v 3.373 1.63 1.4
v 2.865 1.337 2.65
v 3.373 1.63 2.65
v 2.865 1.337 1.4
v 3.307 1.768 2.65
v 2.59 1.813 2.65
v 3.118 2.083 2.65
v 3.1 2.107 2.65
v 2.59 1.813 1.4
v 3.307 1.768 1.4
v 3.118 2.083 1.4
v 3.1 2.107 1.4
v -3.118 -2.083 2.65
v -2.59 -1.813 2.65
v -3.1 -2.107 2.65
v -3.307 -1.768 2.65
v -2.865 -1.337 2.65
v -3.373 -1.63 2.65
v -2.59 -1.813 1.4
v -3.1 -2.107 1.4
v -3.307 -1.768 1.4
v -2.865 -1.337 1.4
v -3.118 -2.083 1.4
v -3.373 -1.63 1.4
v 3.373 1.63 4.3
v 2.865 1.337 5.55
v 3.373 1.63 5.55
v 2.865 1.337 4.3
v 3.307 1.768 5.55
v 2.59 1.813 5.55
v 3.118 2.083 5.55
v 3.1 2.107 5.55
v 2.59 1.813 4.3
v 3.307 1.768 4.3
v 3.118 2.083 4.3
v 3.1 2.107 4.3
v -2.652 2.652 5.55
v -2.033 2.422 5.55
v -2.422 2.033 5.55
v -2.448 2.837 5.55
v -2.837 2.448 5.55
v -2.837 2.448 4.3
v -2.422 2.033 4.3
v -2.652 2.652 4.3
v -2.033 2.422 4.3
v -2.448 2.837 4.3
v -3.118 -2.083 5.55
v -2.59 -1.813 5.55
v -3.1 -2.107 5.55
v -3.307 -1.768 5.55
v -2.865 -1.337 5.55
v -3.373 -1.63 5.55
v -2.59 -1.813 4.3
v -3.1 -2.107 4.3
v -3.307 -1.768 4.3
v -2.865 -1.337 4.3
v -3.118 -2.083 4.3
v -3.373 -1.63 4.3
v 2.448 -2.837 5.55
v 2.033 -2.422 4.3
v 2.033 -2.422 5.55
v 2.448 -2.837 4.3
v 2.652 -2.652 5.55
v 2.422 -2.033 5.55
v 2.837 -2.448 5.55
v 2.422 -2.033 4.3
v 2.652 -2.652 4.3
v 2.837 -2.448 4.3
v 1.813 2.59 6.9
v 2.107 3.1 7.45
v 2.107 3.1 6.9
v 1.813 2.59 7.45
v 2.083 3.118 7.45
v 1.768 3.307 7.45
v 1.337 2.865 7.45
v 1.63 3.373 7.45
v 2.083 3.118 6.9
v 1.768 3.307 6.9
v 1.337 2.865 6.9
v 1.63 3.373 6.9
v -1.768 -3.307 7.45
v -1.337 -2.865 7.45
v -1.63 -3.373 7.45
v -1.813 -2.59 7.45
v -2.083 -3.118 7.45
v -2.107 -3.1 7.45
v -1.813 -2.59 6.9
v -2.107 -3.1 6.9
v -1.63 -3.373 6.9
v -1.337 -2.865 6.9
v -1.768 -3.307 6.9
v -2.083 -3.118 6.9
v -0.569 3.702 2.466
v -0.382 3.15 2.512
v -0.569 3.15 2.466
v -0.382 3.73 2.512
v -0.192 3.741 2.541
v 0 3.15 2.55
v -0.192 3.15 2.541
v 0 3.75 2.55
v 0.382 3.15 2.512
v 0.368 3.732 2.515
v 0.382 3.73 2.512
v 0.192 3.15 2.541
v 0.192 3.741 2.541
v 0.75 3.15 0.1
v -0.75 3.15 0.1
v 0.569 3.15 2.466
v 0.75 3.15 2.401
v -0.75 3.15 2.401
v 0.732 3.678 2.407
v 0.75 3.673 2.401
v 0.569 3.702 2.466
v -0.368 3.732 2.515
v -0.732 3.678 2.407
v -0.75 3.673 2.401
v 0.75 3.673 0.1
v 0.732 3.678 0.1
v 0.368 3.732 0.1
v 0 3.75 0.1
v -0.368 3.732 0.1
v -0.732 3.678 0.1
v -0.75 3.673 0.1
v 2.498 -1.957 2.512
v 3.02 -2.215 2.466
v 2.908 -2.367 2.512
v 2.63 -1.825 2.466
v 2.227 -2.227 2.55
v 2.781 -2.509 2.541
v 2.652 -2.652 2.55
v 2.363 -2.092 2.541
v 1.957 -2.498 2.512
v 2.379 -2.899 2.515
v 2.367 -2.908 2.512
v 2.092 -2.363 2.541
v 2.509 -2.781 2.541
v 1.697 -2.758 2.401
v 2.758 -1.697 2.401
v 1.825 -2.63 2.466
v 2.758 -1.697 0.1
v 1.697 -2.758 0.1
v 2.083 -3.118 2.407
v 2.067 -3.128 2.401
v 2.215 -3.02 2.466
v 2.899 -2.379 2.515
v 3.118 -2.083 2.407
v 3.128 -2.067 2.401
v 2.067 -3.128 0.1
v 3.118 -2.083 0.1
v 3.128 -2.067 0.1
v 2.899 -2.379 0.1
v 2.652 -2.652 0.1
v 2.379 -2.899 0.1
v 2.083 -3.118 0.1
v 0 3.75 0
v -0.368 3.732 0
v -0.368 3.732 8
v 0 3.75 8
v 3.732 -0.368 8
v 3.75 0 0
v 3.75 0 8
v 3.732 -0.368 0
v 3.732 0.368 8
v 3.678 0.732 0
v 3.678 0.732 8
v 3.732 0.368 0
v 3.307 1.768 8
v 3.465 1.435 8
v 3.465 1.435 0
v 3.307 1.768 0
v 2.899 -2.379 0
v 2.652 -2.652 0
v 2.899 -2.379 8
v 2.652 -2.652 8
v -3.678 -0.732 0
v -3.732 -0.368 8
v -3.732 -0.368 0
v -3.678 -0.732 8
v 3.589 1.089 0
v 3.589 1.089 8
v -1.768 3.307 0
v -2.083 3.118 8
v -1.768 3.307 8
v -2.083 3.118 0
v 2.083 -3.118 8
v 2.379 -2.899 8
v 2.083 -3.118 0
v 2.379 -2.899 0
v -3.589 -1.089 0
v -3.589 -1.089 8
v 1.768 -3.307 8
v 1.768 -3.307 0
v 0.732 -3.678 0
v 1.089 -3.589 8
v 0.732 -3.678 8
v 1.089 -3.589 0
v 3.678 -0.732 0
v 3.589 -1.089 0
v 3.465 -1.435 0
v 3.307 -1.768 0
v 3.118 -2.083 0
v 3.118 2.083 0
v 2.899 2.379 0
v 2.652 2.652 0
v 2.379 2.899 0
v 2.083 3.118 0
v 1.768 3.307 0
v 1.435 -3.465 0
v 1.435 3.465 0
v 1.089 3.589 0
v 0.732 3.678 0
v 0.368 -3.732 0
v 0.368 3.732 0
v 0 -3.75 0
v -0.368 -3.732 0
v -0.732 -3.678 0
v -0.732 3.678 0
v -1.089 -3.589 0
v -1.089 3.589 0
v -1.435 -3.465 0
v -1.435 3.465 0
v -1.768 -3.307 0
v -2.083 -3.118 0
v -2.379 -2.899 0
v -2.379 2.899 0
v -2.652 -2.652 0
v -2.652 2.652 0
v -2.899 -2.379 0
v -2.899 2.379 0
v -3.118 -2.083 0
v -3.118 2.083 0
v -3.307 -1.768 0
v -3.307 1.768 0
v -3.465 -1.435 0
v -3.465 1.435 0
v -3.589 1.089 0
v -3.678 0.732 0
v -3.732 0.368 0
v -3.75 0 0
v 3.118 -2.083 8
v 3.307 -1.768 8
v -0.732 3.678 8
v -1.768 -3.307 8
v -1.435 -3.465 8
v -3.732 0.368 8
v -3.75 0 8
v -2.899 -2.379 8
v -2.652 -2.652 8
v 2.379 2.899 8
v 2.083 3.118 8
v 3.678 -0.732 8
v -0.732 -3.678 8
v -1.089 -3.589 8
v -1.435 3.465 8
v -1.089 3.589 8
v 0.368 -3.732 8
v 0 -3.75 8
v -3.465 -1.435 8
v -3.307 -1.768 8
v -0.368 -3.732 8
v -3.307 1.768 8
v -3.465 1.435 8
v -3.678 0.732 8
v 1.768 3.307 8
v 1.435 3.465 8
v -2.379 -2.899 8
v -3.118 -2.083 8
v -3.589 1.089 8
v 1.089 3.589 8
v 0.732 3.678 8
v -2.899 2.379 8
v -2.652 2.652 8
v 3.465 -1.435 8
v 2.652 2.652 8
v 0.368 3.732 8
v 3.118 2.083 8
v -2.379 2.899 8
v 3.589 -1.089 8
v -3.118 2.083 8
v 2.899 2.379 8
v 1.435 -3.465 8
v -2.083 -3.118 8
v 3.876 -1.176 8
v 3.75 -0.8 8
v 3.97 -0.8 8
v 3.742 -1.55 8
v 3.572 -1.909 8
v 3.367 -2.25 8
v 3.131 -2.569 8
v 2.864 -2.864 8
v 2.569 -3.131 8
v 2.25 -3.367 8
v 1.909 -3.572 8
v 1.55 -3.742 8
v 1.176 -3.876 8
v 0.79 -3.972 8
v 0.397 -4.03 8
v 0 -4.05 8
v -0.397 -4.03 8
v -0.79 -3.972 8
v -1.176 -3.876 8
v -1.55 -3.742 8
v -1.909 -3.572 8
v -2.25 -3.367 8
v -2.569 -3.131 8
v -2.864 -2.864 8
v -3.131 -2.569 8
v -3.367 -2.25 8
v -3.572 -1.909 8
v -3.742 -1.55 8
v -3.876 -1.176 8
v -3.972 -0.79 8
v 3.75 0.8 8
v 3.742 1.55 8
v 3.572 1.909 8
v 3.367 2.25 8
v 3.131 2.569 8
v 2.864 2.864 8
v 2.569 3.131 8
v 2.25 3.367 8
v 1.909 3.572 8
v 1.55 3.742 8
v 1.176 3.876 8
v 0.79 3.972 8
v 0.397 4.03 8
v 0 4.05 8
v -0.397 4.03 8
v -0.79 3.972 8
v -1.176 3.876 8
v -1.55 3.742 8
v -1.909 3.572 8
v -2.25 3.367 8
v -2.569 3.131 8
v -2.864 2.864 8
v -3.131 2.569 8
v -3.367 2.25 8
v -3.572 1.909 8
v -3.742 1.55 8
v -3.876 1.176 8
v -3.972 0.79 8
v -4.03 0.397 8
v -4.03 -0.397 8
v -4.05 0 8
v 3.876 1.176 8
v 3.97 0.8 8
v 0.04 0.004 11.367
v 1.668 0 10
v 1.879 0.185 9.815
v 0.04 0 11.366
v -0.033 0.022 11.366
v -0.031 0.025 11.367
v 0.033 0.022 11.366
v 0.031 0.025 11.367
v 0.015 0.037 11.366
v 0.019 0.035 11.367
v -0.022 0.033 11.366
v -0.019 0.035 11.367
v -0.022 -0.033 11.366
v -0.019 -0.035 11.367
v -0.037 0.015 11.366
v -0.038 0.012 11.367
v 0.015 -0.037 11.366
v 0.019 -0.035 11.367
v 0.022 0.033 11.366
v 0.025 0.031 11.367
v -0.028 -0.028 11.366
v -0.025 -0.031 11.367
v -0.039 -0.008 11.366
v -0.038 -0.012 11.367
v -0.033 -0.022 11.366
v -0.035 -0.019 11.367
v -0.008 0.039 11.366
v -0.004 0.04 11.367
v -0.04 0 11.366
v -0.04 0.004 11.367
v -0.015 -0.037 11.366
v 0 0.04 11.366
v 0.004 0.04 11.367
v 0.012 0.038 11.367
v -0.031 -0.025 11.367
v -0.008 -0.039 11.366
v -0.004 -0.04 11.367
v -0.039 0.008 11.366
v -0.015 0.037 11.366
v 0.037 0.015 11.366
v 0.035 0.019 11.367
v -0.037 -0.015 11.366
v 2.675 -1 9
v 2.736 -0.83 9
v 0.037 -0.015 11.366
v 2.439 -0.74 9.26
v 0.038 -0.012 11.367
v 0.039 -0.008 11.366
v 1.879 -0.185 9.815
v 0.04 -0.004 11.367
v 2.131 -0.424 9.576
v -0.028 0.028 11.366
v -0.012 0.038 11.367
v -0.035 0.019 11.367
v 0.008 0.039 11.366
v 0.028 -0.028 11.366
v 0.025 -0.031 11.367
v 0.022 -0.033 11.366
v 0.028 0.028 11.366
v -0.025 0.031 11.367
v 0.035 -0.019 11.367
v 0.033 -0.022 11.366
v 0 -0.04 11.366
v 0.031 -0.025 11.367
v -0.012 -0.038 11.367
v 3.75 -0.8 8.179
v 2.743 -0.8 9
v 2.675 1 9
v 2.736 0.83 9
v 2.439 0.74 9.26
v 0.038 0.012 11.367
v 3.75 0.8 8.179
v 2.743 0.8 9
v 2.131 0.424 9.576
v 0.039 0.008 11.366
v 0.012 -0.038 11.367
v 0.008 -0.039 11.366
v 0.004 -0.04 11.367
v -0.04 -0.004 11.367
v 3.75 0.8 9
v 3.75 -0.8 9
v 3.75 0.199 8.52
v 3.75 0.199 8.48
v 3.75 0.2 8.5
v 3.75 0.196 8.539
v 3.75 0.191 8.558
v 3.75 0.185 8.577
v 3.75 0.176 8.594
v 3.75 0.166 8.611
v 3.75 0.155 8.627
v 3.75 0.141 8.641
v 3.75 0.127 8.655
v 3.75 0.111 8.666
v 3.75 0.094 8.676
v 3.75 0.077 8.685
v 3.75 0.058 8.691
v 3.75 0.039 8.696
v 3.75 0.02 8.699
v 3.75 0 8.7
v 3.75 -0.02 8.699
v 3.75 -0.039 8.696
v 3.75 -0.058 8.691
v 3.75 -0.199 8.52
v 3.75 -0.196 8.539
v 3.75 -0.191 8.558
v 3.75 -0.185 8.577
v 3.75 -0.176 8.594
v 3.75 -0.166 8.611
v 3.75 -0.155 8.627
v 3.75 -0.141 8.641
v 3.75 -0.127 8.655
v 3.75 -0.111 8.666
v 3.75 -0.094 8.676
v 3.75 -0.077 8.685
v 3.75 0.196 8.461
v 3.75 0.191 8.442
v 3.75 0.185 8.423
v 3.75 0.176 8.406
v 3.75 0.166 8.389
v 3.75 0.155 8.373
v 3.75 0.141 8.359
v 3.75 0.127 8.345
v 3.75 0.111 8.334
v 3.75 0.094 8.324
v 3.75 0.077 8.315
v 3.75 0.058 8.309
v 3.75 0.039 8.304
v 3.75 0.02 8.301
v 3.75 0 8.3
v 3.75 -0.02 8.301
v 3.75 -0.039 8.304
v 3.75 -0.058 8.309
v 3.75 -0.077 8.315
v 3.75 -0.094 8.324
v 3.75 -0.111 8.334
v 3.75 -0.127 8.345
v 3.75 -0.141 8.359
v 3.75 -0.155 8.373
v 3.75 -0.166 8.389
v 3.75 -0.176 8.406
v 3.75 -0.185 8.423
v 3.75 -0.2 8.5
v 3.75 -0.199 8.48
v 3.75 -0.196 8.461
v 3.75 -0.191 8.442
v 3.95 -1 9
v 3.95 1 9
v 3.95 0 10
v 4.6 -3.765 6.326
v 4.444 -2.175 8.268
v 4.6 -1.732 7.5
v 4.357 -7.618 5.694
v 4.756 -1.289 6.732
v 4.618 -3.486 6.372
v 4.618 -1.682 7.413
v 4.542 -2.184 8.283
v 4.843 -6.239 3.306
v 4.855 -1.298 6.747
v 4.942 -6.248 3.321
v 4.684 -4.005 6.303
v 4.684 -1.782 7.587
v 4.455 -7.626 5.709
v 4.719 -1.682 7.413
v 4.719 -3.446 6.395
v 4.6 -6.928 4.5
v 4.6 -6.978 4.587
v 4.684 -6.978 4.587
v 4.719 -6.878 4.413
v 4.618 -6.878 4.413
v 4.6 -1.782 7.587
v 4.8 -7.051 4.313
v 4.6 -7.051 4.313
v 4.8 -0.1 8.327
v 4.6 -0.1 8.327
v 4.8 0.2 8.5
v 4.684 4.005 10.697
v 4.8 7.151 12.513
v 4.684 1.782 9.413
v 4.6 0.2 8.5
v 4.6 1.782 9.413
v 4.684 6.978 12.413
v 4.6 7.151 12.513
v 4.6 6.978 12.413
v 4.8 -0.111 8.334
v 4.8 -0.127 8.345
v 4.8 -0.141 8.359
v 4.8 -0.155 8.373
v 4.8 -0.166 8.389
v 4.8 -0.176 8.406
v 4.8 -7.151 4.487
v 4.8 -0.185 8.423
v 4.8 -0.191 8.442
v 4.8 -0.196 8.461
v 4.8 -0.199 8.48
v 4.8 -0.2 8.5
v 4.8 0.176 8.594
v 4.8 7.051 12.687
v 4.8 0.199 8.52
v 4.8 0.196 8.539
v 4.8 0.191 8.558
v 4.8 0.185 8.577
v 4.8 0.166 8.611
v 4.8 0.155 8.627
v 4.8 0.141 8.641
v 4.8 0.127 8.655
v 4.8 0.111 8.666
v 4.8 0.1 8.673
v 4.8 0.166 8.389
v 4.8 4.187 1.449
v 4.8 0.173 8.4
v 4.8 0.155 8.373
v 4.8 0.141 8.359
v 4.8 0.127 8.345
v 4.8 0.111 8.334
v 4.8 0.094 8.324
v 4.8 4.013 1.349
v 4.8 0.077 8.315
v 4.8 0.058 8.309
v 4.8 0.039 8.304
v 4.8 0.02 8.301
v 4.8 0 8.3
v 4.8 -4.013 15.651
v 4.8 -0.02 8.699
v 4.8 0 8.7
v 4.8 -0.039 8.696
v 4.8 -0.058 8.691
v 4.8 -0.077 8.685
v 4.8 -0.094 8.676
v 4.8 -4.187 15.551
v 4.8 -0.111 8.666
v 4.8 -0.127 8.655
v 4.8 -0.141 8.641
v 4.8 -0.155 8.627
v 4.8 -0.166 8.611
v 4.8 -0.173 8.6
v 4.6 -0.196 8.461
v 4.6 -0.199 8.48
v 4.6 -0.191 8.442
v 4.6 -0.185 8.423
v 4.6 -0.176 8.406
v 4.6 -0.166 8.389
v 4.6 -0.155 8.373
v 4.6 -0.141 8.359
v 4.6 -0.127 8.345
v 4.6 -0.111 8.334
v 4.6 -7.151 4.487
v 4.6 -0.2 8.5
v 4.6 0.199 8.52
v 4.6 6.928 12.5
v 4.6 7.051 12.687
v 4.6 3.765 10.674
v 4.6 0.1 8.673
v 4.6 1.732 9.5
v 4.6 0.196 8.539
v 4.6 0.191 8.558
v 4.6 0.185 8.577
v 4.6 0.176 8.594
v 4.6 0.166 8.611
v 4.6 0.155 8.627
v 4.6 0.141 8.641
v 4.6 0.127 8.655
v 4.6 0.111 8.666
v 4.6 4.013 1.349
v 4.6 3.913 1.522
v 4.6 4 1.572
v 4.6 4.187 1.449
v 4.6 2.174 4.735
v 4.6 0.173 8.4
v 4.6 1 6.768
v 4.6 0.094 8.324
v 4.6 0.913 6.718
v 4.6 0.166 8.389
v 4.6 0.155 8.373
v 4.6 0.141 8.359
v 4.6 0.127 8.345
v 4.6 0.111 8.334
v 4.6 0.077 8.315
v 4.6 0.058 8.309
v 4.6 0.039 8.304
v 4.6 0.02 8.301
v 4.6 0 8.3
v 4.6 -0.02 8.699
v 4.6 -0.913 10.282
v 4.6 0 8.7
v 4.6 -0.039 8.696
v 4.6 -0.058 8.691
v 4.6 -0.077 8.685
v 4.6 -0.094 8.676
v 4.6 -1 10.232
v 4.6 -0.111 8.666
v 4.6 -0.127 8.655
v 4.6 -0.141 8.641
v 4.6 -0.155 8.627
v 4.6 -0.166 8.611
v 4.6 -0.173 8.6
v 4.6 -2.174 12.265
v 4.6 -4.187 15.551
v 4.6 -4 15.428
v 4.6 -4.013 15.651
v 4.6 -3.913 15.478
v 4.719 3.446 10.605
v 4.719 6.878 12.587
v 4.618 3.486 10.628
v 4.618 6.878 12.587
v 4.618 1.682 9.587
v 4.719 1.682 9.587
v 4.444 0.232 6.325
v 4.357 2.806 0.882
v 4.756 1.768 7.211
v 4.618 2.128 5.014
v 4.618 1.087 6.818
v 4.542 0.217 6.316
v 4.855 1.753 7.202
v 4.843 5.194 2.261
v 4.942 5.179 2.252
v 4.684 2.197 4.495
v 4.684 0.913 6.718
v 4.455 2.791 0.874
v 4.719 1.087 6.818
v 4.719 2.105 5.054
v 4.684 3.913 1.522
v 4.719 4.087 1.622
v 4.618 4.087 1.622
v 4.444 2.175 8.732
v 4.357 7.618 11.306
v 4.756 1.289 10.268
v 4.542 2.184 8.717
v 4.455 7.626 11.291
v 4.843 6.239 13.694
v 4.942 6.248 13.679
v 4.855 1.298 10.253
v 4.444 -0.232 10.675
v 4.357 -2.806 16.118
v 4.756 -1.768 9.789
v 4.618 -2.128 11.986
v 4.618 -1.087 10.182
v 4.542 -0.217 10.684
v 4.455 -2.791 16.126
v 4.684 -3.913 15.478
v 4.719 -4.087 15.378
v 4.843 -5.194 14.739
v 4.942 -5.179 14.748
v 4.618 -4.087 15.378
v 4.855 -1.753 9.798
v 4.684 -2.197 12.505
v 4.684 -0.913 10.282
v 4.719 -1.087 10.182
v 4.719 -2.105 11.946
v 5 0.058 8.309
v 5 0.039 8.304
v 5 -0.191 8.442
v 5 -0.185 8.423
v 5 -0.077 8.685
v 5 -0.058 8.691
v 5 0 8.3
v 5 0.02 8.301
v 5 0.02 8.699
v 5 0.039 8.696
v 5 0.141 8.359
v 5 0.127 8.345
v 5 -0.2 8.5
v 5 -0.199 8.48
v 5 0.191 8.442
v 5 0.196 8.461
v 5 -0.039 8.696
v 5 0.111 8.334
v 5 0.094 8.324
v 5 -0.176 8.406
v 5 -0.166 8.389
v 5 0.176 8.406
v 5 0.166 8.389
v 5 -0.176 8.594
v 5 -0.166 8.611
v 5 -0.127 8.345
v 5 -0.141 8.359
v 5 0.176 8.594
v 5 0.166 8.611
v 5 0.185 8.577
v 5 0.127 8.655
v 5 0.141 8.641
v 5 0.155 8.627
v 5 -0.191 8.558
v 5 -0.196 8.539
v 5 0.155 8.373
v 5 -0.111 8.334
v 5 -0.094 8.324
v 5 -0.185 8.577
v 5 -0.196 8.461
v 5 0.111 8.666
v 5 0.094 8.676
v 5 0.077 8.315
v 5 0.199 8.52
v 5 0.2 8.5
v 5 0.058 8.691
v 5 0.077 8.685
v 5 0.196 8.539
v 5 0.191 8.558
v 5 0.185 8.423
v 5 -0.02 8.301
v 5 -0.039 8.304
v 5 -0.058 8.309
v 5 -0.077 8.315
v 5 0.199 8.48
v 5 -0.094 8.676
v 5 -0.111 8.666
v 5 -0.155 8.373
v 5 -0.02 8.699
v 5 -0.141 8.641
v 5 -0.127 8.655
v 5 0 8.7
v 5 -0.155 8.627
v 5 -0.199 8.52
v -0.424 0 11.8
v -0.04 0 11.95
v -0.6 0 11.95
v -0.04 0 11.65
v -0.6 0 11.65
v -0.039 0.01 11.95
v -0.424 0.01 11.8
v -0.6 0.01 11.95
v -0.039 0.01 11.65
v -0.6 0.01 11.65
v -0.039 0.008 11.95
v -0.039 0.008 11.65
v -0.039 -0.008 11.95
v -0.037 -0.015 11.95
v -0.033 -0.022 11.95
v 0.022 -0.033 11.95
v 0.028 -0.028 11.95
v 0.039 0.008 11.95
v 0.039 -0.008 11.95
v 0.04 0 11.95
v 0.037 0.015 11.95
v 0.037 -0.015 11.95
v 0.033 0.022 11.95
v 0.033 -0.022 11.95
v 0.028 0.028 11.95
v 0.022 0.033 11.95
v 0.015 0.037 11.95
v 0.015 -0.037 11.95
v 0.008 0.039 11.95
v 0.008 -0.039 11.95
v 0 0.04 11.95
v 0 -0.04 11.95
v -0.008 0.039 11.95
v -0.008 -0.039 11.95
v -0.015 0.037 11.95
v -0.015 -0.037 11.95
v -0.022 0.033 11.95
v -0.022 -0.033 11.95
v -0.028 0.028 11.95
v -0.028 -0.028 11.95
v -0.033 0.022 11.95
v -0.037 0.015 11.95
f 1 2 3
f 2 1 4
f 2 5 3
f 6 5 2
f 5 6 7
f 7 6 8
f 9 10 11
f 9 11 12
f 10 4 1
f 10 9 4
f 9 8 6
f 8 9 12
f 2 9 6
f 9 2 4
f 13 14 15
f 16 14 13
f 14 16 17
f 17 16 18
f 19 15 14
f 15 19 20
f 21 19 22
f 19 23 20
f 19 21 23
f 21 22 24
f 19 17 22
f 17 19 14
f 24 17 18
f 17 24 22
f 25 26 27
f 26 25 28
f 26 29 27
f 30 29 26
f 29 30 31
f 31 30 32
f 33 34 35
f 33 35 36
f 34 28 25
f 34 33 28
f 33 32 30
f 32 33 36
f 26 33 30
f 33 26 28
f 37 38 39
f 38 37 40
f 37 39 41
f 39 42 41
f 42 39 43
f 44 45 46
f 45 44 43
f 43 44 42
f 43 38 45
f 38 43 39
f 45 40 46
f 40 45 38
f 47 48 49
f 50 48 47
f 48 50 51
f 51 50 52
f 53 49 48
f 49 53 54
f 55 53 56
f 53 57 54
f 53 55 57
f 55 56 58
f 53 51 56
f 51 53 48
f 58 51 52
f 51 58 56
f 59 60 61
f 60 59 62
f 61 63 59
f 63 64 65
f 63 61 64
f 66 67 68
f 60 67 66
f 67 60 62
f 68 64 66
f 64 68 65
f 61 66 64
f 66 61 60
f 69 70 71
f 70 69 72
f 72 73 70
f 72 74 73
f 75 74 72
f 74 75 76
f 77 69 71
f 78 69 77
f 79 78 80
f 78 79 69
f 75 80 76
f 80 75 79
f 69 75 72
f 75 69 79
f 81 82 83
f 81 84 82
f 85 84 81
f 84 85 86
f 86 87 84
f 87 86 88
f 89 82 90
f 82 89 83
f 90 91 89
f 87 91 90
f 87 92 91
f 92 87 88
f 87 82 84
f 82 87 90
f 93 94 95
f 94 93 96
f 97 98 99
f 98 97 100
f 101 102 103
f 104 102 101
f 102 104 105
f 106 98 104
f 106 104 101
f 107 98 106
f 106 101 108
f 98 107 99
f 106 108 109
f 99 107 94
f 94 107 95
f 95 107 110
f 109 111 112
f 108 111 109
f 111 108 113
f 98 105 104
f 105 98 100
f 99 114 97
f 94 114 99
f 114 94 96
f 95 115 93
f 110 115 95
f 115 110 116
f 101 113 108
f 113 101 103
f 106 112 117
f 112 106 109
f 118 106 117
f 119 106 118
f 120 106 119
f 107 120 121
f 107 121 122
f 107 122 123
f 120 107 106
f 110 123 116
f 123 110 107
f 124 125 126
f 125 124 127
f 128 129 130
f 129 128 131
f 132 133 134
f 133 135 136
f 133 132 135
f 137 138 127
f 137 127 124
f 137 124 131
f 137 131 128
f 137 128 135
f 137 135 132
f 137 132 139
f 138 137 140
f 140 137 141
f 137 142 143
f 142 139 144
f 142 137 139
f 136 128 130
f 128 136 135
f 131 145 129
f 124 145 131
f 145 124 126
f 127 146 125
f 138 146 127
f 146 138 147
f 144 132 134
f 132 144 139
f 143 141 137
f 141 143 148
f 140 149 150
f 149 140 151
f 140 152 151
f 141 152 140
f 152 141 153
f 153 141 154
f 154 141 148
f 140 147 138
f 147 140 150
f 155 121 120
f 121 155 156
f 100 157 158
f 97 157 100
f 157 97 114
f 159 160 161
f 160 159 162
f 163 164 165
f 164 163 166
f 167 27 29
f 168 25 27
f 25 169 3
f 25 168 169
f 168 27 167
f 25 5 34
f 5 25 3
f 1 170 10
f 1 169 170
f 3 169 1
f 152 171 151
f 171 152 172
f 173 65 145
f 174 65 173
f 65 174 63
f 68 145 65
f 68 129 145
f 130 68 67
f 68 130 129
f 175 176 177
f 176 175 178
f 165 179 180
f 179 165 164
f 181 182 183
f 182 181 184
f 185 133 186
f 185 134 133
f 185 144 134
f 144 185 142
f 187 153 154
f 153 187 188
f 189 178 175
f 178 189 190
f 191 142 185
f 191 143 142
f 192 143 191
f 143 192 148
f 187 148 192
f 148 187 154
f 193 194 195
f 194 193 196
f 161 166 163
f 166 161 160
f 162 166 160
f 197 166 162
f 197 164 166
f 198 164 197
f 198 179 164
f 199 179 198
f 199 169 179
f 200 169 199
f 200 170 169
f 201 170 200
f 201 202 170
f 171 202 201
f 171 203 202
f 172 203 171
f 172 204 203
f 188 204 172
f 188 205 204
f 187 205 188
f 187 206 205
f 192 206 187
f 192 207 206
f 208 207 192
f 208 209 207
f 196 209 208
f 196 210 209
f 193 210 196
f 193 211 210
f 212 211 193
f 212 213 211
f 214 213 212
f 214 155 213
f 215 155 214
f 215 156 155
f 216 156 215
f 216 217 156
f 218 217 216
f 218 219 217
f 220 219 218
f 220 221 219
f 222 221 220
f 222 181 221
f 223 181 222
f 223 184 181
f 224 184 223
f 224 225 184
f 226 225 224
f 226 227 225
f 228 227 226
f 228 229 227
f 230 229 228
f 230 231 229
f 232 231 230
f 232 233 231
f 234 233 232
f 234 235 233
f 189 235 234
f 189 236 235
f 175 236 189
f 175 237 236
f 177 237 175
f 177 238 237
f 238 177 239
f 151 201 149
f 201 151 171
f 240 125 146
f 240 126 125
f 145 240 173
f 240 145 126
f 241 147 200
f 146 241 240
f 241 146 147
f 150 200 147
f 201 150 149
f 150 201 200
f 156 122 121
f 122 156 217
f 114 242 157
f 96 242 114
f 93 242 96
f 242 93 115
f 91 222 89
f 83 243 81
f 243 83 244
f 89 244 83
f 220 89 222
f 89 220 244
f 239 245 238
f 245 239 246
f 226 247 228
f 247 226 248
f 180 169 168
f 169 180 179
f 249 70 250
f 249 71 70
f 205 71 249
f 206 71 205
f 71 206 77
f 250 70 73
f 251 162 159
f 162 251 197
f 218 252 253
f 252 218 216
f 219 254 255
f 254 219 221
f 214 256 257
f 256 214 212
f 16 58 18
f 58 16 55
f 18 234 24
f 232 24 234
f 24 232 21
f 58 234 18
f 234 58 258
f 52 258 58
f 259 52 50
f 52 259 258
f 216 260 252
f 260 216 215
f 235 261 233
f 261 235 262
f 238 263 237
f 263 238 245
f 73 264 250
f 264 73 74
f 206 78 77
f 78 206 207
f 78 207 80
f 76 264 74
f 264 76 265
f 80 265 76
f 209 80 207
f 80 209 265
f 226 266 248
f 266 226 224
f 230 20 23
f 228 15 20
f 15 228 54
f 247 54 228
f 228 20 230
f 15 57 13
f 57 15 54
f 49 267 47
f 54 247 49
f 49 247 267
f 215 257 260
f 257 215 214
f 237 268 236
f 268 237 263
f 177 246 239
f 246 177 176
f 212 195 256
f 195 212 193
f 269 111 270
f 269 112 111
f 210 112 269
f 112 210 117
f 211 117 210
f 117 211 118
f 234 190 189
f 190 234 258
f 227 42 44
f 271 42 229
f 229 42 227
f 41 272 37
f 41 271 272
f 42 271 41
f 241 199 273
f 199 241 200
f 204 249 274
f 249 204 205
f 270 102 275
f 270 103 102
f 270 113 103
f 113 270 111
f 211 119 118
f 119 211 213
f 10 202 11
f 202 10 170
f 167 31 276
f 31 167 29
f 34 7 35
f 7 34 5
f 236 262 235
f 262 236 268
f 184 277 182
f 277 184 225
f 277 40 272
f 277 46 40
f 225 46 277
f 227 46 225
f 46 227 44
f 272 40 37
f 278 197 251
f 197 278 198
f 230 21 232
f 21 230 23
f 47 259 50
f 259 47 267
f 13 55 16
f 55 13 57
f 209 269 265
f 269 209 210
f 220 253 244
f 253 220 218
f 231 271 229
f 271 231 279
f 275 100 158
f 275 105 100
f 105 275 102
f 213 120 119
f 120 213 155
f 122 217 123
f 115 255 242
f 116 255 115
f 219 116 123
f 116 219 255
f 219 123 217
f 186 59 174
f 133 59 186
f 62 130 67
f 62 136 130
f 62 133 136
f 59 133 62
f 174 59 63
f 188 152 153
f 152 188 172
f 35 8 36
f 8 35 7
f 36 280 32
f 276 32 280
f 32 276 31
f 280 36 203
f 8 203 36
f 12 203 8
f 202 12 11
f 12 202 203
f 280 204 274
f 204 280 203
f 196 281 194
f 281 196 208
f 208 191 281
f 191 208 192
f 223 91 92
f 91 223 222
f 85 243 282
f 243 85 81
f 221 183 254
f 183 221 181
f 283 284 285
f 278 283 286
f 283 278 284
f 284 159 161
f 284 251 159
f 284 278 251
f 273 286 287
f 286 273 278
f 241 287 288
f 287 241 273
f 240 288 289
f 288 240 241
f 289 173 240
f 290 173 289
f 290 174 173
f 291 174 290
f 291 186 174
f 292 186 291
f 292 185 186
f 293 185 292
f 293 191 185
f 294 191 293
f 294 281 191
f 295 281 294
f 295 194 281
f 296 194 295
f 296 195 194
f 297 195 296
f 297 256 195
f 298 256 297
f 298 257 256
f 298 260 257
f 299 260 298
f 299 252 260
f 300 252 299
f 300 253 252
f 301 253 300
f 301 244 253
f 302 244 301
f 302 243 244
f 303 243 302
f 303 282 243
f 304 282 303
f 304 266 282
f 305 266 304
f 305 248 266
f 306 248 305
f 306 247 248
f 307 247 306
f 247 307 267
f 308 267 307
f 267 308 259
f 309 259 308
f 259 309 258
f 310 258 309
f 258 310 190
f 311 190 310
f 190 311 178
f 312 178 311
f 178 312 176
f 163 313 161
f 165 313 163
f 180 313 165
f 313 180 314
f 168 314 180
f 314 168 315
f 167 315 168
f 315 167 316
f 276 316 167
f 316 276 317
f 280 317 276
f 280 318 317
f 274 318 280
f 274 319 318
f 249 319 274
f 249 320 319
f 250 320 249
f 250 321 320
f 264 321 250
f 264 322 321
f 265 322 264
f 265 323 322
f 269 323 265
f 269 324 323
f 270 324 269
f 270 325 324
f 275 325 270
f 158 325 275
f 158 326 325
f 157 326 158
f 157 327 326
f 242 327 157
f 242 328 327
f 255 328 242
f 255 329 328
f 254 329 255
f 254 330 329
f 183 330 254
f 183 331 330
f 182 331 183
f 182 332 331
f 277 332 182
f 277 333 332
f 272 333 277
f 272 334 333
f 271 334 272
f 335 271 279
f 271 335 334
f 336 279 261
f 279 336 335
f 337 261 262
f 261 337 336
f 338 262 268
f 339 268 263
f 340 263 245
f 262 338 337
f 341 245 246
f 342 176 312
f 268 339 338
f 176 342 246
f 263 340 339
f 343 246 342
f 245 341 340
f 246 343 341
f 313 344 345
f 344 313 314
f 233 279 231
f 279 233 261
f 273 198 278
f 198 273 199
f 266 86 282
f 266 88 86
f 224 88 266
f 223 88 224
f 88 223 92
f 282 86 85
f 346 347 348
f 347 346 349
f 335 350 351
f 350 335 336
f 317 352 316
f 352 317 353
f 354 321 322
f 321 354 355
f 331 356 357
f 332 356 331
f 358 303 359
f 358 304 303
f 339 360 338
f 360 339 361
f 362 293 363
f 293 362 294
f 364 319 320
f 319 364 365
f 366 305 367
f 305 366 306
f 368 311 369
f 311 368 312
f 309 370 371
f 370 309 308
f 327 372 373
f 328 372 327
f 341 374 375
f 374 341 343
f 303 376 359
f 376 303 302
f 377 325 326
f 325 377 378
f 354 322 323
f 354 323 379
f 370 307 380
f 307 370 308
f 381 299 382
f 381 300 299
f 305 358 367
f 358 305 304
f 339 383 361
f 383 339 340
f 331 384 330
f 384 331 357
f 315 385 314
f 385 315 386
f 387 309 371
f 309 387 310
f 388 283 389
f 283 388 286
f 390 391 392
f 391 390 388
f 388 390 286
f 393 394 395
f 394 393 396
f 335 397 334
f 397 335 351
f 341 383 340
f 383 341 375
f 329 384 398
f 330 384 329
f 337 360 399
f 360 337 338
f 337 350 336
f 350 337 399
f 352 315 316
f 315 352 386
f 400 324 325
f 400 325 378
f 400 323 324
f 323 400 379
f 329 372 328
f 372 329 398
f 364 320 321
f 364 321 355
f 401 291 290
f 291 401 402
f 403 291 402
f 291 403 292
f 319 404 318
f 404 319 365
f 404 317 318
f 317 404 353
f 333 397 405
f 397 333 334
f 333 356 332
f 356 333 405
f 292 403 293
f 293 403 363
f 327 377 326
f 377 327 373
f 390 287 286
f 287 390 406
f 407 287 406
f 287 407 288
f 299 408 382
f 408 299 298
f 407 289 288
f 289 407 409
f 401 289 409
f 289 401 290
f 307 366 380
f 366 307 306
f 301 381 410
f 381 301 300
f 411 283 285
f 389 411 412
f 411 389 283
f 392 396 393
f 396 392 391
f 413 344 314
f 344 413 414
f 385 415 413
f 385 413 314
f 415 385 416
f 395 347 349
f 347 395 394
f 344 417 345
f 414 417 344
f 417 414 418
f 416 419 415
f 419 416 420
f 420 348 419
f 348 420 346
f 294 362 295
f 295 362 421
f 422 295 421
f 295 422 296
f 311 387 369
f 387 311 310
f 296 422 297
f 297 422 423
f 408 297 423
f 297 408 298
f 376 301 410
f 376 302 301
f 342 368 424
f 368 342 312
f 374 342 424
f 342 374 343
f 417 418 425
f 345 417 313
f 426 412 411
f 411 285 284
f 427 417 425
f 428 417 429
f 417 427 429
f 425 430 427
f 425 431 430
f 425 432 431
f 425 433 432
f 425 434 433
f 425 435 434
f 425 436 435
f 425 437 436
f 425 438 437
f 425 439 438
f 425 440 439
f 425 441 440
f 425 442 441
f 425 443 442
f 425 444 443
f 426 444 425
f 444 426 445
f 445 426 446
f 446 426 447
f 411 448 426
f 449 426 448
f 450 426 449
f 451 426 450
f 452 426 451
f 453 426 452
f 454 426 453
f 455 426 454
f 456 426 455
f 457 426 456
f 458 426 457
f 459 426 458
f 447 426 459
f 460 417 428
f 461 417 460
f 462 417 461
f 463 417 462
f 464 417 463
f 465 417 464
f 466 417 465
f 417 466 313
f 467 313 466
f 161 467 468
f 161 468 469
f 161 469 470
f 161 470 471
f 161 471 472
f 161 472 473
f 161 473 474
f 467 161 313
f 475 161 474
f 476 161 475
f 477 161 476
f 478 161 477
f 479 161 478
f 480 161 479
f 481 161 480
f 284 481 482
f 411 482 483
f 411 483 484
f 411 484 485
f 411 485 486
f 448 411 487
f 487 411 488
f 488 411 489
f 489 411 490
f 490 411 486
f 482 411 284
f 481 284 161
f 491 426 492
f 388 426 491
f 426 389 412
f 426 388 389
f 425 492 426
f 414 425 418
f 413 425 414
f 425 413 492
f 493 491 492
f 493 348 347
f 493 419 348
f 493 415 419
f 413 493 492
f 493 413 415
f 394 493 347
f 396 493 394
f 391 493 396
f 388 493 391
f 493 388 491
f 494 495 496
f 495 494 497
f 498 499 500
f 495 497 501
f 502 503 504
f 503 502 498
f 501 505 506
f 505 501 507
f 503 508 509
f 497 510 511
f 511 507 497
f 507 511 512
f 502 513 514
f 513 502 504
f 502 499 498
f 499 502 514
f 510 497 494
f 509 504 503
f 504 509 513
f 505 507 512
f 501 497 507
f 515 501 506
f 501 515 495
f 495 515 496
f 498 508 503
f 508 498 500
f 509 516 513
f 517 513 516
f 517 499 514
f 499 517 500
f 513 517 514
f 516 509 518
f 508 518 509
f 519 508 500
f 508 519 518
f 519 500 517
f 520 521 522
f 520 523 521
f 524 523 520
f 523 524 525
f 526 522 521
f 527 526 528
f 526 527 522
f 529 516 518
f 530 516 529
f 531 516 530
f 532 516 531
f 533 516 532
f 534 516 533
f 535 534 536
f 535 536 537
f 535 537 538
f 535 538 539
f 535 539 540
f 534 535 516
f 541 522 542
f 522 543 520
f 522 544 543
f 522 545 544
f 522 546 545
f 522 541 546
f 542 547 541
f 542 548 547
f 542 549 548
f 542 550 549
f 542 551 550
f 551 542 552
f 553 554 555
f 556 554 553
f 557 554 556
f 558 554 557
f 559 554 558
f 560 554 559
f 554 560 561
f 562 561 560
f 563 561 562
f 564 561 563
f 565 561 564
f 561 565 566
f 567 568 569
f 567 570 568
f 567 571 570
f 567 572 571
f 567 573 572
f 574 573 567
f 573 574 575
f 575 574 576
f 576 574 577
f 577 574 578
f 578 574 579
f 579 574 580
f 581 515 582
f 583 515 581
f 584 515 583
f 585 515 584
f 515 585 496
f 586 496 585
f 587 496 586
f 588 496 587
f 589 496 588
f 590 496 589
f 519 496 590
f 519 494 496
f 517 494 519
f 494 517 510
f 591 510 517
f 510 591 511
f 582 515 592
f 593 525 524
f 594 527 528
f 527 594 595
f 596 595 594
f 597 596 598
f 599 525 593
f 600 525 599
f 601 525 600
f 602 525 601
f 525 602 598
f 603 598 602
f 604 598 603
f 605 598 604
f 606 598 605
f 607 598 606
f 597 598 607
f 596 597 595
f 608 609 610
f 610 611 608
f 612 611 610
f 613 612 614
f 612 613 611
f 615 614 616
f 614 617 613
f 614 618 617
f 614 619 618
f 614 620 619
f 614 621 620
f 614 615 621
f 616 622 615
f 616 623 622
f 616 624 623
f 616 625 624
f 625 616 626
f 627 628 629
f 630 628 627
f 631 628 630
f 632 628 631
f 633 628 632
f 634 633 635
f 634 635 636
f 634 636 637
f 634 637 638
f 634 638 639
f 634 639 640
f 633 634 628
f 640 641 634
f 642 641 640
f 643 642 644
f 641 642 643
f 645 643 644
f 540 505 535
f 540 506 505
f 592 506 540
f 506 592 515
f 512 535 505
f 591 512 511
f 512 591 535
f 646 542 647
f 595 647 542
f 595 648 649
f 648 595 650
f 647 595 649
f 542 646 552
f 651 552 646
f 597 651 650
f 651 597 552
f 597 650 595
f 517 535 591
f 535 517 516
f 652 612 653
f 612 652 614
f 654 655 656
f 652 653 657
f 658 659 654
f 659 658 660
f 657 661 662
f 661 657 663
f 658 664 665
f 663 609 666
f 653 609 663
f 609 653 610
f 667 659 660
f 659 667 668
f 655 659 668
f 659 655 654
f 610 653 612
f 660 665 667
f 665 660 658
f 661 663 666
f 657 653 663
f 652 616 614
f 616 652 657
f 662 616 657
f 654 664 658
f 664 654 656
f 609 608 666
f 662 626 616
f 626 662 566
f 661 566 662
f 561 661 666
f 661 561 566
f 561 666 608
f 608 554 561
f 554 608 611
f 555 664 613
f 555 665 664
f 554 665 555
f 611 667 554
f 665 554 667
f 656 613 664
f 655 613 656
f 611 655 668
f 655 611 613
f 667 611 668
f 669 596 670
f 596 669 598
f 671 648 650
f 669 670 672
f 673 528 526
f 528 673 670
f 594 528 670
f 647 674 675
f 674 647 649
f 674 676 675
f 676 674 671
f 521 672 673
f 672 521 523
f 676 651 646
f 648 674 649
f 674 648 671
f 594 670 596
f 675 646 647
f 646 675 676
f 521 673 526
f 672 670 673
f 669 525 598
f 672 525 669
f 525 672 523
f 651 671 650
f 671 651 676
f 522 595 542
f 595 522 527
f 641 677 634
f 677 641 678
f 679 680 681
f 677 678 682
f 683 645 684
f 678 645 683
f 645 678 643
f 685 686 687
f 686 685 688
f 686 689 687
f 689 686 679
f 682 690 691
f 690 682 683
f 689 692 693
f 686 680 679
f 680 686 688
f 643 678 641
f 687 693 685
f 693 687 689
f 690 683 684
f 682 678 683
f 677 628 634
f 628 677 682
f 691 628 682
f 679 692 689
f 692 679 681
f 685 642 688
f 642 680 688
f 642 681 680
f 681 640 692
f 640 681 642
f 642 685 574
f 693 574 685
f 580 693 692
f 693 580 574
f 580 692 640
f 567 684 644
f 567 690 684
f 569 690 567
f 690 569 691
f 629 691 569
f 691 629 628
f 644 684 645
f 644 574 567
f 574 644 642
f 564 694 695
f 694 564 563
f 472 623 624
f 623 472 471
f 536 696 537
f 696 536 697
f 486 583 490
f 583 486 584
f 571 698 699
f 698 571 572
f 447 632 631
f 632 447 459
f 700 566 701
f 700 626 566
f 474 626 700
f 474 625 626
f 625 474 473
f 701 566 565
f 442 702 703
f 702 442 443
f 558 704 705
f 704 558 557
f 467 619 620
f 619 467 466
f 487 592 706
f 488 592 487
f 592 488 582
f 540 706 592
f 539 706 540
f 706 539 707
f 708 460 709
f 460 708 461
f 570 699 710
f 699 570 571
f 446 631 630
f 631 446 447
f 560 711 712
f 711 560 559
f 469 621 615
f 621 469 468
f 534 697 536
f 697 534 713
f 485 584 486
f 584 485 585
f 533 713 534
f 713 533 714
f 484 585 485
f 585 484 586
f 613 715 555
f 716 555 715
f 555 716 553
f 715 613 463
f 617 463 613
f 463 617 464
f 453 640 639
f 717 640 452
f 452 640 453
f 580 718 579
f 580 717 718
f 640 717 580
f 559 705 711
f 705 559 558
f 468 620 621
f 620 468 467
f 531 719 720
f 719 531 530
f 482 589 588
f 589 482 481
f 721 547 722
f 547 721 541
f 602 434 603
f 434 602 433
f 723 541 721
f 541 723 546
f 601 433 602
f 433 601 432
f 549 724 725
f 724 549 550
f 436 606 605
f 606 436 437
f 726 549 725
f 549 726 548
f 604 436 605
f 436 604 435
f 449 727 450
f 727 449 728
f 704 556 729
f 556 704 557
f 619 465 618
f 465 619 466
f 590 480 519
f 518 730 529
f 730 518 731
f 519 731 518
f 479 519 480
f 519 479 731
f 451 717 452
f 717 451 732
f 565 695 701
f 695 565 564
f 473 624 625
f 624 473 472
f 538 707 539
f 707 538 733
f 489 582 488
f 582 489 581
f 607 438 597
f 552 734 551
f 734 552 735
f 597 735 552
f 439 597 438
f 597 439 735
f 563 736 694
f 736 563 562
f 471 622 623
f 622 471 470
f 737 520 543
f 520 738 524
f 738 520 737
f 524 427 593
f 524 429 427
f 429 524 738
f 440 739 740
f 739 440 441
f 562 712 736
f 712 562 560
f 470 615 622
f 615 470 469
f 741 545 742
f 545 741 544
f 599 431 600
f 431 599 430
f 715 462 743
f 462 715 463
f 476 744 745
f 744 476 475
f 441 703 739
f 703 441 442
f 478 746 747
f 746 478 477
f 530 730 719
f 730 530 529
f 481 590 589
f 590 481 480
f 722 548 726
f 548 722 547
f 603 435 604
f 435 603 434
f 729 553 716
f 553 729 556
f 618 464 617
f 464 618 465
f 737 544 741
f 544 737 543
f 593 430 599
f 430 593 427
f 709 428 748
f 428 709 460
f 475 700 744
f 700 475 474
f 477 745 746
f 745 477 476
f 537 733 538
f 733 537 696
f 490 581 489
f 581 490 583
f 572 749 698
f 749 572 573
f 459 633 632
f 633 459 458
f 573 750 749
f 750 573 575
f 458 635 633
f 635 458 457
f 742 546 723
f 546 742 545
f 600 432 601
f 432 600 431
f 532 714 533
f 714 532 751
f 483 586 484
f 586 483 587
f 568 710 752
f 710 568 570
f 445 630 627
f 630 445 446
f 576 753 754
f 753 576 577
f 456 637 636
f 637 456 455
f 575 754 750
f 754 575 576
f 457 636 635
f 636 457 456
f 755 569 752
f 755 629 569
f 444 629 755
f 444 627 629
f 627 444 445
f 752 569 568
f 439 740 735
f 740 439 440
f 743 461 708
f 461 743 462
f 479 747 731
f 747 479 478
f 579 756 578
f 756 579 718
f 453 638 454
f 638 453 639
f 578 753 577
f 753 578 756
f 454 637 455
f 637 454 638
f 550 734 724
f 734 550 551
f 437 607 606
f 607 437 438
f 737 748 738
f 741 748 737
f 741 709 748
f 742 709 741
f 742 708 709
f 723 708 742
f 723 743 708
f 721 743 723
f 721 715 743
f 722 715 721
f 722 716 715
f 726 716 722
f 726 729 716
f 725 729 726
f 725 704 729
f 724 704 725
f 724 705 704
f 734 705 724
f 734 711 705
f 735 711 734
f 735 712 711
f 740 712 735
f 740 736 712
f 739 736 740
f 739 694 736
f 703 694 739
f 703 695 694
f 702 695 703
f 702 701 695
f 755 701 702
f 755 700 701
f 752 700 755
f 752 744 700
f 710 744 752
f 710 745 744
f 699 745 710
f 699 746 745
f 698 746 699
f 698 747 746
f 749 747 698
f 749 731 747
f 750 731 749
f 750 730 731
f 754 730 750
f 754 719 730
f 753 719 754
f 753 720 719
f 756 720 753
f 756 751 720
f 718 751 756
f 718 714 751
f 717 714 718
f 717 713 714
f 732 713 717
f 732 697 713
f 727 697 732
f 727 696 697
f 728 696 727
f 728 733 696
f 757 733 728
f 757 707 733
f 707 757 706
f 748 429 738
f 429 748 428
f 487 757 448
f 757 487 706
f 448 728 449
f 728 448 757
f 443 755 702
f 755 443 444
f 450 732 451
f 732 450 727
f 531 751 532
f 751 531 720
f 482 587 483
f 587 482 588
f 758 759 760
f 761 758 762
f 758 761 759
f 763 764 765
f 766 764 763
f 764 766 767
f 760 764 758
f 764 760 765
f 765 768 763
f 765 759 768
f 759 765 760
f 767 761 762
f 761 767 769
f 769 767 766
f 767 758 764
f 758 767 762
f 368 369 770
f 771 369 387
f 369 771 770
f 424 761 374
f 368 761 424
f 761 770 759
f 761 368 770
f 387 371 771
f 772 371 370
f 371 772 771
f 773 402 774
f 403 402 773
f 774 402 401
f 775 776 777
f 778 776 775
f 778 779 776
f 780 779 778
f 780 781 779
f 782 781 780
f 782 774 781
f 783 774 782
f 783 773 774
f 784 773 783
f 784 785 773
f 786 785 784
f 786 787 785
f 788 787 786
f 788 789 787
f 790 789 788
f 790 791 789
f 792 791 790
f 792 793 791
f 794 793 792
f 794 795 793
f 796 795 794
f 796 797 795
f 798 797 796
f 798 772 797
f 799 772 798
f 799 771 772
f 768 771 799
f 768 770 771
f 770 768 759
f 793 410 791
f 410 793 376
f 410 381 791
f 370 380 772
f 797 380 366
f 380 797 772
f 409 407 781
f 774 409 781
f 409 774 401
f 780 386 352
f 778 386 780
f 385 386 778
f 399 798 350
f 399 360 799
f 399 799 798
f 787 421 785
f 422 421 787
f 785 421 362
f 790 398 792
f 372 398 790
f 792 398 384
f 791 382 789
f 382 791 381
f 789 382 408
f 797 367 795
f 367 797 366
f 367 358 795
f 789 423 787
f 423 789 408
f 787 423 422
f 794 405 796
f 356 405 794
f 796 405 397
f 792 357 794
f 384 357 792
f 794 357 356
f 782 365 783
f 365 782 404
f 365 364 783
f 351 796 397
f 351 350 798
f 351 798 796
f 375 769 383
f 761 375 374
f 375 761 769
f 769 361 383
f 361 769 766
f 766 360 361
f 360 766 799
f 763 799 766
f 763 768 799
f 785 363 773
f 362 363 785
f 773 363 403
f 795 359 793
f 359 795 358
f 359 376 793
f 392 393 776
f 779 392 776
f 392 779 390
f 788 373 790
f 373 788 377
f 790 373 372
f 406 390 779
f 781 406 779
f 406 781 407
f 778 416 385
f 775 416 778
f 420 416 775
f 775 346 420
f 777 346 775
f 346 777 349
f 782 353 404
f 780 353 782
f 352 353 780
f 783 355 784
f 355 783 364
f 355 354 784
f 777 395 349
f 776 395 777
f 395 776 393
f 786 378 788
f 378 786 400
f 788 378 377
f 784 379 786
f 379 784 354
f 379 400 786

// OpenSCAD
$fn = 64;

bkamen = [238/255,229/255,208/255];
bdrevo = [140/255,140/255,120/255];  

module strecha(vyska, hloubka) {
  rotate(90, [0,0,1]) rotate(90, [1,0,0])
  linear_extrude(height=hloubka) 
  polygon(points=[[-vyska,0],[vyska,0],[0,vyska]]);
}

module budka(vyska, sirka, hloubka, dx, dz, presah=0.2) {
  v2 = vyska/2;
  sirkax = sirka-2*presah;
  translate([dx,-sirkax/2,dz]) cube([hloubka,sirkax,v2]);
  translate([dx+presah,0,dz+v2]) strecha(sirka/2,hloubka);
}

module budkaDira(vyska, sirka, hloubka, dx, dz, presah=0.2) {
  v2 = vyska/2;
  sirkax = sirka-2*presah;
  translate([dx,-sirkax/2,dz]) cube([hloubka,sirkax,v2]);
}

module okno(sirka, vyska, hloubka=1) {
  translate([-sirka/2,0,0]) cube([sirka,hloubka,vyska]);
}

module dvere(sirka, vyska, hloubka=1) {
  intersection() {
    rotate(90, [1,0,0]) translate([0,vyska*0.2,-hloubka]) cylinder(hloubka,vyska*0.8,vyska*0.8,$fn=64);
    translate([-sirka/2,0,0]) cube([sirka,hloubka,vyska]);
  }
}

module budova(vyska,sirka,strecha,presah) {
  polomer = sirka/2;
  wokno = 0.55;
  hokno = 1.25;
  wstena = 0.6;
  difference() {
    color(bkamen) cylinder(vyska,polomer,polomer);
    // Velka okna
    for (a = [0,180]) {
      rotate(a-60, [0,0,1]) translate([0,polomer-wstena,1.4]) okno(wokno,hokno);
    }
    for (a = [0,105,180,285]) {
      rotate(a-60, [0,0,1]) translate([0,polomer-wstena,4.3]) okno(wokno,hokno);
    }
    // Mala okna
    for (a = [0,180]) {
      rotate(a-30, [0,0,1]) translate([0,polomer-wstena,6.9]) okno(wokno,wokno);
    }
    // Dvere
    for (a = [0,-135]) {
      rotate(a, [0,0,1]) translate([0,polomer-wstena,0.1]) dvere(1.5,2.45);
    }
  }
  difference() {
	color(bdrevo) translate([0,0,vyska]) cylinder(strecha,polomer+presah,0);
	budkaDira(2.0,2.0,3,polomer-3+presah,vyska-0.1);
  }
  color(bdrevo) budka(2.0,2.0,3,polomer-3,vyska);
}

module lopata(delka, sirkaA, sirkaB, tloustka=0.1) {
  linear_extrude(height=tloustka) 
  polygon(points=[[-sirkaA/2,-delka],[sirkaA/2,-delka],[sirkaB/2,0], [-sirkaB/2,0]]);
}

module vrtule(polomer, tram=0.2) {
  delkaLopaty = 6;
  for (a = [0,90,180,270]) {
    rotate(a, [0,0,1]) rotate(-10, [0,1,0]) translate([0,delkaLopaty-polomer,0]) lopata(delkaLopaty,2.8,1.8);
    rotate(a, [0,0,1]) translate([-tram/2,-polomer-tram, 0]) cube([tram,polomer+tram,tram]);
  }
}

module hridel(natoceni=30) {
  polomer = 0.2;
  vyska   = 8.5;
  color(bdrevo) translate([1.25,0,vyska]) rotate(90, [0,1,0]) cylinder(3.75,polomer,polomer);
  translate([4.6,0,vyska]) rotate(natoceni, [1,0,0]) rotate(90, [0,1,0]) vrtule(8);
}

module praporek(vyska,sirka,tloustka=0.01,tycka=0.04) {
  v2 = vyska/2;
  s2 = sirka*0.707;
  translate([0,0,11.8]) rotate(180, [0,0,1])
  union() {
    rotate(90, [1,0,0]) 
      linear_extrude(height=tloustka) polygon(points=[[0,-v2], [0,v2], [sirka,v2], [s2,0], [sirka,-v2]]);
    translate([0,0,-1.5*vyska]) cylinder(2*vyska,tycka,tycka,$fn=32);
  }
}

budova(8,7.5,3.4,0.3);
hridel(30+360*$t);
praporek(0.3,0.6);
